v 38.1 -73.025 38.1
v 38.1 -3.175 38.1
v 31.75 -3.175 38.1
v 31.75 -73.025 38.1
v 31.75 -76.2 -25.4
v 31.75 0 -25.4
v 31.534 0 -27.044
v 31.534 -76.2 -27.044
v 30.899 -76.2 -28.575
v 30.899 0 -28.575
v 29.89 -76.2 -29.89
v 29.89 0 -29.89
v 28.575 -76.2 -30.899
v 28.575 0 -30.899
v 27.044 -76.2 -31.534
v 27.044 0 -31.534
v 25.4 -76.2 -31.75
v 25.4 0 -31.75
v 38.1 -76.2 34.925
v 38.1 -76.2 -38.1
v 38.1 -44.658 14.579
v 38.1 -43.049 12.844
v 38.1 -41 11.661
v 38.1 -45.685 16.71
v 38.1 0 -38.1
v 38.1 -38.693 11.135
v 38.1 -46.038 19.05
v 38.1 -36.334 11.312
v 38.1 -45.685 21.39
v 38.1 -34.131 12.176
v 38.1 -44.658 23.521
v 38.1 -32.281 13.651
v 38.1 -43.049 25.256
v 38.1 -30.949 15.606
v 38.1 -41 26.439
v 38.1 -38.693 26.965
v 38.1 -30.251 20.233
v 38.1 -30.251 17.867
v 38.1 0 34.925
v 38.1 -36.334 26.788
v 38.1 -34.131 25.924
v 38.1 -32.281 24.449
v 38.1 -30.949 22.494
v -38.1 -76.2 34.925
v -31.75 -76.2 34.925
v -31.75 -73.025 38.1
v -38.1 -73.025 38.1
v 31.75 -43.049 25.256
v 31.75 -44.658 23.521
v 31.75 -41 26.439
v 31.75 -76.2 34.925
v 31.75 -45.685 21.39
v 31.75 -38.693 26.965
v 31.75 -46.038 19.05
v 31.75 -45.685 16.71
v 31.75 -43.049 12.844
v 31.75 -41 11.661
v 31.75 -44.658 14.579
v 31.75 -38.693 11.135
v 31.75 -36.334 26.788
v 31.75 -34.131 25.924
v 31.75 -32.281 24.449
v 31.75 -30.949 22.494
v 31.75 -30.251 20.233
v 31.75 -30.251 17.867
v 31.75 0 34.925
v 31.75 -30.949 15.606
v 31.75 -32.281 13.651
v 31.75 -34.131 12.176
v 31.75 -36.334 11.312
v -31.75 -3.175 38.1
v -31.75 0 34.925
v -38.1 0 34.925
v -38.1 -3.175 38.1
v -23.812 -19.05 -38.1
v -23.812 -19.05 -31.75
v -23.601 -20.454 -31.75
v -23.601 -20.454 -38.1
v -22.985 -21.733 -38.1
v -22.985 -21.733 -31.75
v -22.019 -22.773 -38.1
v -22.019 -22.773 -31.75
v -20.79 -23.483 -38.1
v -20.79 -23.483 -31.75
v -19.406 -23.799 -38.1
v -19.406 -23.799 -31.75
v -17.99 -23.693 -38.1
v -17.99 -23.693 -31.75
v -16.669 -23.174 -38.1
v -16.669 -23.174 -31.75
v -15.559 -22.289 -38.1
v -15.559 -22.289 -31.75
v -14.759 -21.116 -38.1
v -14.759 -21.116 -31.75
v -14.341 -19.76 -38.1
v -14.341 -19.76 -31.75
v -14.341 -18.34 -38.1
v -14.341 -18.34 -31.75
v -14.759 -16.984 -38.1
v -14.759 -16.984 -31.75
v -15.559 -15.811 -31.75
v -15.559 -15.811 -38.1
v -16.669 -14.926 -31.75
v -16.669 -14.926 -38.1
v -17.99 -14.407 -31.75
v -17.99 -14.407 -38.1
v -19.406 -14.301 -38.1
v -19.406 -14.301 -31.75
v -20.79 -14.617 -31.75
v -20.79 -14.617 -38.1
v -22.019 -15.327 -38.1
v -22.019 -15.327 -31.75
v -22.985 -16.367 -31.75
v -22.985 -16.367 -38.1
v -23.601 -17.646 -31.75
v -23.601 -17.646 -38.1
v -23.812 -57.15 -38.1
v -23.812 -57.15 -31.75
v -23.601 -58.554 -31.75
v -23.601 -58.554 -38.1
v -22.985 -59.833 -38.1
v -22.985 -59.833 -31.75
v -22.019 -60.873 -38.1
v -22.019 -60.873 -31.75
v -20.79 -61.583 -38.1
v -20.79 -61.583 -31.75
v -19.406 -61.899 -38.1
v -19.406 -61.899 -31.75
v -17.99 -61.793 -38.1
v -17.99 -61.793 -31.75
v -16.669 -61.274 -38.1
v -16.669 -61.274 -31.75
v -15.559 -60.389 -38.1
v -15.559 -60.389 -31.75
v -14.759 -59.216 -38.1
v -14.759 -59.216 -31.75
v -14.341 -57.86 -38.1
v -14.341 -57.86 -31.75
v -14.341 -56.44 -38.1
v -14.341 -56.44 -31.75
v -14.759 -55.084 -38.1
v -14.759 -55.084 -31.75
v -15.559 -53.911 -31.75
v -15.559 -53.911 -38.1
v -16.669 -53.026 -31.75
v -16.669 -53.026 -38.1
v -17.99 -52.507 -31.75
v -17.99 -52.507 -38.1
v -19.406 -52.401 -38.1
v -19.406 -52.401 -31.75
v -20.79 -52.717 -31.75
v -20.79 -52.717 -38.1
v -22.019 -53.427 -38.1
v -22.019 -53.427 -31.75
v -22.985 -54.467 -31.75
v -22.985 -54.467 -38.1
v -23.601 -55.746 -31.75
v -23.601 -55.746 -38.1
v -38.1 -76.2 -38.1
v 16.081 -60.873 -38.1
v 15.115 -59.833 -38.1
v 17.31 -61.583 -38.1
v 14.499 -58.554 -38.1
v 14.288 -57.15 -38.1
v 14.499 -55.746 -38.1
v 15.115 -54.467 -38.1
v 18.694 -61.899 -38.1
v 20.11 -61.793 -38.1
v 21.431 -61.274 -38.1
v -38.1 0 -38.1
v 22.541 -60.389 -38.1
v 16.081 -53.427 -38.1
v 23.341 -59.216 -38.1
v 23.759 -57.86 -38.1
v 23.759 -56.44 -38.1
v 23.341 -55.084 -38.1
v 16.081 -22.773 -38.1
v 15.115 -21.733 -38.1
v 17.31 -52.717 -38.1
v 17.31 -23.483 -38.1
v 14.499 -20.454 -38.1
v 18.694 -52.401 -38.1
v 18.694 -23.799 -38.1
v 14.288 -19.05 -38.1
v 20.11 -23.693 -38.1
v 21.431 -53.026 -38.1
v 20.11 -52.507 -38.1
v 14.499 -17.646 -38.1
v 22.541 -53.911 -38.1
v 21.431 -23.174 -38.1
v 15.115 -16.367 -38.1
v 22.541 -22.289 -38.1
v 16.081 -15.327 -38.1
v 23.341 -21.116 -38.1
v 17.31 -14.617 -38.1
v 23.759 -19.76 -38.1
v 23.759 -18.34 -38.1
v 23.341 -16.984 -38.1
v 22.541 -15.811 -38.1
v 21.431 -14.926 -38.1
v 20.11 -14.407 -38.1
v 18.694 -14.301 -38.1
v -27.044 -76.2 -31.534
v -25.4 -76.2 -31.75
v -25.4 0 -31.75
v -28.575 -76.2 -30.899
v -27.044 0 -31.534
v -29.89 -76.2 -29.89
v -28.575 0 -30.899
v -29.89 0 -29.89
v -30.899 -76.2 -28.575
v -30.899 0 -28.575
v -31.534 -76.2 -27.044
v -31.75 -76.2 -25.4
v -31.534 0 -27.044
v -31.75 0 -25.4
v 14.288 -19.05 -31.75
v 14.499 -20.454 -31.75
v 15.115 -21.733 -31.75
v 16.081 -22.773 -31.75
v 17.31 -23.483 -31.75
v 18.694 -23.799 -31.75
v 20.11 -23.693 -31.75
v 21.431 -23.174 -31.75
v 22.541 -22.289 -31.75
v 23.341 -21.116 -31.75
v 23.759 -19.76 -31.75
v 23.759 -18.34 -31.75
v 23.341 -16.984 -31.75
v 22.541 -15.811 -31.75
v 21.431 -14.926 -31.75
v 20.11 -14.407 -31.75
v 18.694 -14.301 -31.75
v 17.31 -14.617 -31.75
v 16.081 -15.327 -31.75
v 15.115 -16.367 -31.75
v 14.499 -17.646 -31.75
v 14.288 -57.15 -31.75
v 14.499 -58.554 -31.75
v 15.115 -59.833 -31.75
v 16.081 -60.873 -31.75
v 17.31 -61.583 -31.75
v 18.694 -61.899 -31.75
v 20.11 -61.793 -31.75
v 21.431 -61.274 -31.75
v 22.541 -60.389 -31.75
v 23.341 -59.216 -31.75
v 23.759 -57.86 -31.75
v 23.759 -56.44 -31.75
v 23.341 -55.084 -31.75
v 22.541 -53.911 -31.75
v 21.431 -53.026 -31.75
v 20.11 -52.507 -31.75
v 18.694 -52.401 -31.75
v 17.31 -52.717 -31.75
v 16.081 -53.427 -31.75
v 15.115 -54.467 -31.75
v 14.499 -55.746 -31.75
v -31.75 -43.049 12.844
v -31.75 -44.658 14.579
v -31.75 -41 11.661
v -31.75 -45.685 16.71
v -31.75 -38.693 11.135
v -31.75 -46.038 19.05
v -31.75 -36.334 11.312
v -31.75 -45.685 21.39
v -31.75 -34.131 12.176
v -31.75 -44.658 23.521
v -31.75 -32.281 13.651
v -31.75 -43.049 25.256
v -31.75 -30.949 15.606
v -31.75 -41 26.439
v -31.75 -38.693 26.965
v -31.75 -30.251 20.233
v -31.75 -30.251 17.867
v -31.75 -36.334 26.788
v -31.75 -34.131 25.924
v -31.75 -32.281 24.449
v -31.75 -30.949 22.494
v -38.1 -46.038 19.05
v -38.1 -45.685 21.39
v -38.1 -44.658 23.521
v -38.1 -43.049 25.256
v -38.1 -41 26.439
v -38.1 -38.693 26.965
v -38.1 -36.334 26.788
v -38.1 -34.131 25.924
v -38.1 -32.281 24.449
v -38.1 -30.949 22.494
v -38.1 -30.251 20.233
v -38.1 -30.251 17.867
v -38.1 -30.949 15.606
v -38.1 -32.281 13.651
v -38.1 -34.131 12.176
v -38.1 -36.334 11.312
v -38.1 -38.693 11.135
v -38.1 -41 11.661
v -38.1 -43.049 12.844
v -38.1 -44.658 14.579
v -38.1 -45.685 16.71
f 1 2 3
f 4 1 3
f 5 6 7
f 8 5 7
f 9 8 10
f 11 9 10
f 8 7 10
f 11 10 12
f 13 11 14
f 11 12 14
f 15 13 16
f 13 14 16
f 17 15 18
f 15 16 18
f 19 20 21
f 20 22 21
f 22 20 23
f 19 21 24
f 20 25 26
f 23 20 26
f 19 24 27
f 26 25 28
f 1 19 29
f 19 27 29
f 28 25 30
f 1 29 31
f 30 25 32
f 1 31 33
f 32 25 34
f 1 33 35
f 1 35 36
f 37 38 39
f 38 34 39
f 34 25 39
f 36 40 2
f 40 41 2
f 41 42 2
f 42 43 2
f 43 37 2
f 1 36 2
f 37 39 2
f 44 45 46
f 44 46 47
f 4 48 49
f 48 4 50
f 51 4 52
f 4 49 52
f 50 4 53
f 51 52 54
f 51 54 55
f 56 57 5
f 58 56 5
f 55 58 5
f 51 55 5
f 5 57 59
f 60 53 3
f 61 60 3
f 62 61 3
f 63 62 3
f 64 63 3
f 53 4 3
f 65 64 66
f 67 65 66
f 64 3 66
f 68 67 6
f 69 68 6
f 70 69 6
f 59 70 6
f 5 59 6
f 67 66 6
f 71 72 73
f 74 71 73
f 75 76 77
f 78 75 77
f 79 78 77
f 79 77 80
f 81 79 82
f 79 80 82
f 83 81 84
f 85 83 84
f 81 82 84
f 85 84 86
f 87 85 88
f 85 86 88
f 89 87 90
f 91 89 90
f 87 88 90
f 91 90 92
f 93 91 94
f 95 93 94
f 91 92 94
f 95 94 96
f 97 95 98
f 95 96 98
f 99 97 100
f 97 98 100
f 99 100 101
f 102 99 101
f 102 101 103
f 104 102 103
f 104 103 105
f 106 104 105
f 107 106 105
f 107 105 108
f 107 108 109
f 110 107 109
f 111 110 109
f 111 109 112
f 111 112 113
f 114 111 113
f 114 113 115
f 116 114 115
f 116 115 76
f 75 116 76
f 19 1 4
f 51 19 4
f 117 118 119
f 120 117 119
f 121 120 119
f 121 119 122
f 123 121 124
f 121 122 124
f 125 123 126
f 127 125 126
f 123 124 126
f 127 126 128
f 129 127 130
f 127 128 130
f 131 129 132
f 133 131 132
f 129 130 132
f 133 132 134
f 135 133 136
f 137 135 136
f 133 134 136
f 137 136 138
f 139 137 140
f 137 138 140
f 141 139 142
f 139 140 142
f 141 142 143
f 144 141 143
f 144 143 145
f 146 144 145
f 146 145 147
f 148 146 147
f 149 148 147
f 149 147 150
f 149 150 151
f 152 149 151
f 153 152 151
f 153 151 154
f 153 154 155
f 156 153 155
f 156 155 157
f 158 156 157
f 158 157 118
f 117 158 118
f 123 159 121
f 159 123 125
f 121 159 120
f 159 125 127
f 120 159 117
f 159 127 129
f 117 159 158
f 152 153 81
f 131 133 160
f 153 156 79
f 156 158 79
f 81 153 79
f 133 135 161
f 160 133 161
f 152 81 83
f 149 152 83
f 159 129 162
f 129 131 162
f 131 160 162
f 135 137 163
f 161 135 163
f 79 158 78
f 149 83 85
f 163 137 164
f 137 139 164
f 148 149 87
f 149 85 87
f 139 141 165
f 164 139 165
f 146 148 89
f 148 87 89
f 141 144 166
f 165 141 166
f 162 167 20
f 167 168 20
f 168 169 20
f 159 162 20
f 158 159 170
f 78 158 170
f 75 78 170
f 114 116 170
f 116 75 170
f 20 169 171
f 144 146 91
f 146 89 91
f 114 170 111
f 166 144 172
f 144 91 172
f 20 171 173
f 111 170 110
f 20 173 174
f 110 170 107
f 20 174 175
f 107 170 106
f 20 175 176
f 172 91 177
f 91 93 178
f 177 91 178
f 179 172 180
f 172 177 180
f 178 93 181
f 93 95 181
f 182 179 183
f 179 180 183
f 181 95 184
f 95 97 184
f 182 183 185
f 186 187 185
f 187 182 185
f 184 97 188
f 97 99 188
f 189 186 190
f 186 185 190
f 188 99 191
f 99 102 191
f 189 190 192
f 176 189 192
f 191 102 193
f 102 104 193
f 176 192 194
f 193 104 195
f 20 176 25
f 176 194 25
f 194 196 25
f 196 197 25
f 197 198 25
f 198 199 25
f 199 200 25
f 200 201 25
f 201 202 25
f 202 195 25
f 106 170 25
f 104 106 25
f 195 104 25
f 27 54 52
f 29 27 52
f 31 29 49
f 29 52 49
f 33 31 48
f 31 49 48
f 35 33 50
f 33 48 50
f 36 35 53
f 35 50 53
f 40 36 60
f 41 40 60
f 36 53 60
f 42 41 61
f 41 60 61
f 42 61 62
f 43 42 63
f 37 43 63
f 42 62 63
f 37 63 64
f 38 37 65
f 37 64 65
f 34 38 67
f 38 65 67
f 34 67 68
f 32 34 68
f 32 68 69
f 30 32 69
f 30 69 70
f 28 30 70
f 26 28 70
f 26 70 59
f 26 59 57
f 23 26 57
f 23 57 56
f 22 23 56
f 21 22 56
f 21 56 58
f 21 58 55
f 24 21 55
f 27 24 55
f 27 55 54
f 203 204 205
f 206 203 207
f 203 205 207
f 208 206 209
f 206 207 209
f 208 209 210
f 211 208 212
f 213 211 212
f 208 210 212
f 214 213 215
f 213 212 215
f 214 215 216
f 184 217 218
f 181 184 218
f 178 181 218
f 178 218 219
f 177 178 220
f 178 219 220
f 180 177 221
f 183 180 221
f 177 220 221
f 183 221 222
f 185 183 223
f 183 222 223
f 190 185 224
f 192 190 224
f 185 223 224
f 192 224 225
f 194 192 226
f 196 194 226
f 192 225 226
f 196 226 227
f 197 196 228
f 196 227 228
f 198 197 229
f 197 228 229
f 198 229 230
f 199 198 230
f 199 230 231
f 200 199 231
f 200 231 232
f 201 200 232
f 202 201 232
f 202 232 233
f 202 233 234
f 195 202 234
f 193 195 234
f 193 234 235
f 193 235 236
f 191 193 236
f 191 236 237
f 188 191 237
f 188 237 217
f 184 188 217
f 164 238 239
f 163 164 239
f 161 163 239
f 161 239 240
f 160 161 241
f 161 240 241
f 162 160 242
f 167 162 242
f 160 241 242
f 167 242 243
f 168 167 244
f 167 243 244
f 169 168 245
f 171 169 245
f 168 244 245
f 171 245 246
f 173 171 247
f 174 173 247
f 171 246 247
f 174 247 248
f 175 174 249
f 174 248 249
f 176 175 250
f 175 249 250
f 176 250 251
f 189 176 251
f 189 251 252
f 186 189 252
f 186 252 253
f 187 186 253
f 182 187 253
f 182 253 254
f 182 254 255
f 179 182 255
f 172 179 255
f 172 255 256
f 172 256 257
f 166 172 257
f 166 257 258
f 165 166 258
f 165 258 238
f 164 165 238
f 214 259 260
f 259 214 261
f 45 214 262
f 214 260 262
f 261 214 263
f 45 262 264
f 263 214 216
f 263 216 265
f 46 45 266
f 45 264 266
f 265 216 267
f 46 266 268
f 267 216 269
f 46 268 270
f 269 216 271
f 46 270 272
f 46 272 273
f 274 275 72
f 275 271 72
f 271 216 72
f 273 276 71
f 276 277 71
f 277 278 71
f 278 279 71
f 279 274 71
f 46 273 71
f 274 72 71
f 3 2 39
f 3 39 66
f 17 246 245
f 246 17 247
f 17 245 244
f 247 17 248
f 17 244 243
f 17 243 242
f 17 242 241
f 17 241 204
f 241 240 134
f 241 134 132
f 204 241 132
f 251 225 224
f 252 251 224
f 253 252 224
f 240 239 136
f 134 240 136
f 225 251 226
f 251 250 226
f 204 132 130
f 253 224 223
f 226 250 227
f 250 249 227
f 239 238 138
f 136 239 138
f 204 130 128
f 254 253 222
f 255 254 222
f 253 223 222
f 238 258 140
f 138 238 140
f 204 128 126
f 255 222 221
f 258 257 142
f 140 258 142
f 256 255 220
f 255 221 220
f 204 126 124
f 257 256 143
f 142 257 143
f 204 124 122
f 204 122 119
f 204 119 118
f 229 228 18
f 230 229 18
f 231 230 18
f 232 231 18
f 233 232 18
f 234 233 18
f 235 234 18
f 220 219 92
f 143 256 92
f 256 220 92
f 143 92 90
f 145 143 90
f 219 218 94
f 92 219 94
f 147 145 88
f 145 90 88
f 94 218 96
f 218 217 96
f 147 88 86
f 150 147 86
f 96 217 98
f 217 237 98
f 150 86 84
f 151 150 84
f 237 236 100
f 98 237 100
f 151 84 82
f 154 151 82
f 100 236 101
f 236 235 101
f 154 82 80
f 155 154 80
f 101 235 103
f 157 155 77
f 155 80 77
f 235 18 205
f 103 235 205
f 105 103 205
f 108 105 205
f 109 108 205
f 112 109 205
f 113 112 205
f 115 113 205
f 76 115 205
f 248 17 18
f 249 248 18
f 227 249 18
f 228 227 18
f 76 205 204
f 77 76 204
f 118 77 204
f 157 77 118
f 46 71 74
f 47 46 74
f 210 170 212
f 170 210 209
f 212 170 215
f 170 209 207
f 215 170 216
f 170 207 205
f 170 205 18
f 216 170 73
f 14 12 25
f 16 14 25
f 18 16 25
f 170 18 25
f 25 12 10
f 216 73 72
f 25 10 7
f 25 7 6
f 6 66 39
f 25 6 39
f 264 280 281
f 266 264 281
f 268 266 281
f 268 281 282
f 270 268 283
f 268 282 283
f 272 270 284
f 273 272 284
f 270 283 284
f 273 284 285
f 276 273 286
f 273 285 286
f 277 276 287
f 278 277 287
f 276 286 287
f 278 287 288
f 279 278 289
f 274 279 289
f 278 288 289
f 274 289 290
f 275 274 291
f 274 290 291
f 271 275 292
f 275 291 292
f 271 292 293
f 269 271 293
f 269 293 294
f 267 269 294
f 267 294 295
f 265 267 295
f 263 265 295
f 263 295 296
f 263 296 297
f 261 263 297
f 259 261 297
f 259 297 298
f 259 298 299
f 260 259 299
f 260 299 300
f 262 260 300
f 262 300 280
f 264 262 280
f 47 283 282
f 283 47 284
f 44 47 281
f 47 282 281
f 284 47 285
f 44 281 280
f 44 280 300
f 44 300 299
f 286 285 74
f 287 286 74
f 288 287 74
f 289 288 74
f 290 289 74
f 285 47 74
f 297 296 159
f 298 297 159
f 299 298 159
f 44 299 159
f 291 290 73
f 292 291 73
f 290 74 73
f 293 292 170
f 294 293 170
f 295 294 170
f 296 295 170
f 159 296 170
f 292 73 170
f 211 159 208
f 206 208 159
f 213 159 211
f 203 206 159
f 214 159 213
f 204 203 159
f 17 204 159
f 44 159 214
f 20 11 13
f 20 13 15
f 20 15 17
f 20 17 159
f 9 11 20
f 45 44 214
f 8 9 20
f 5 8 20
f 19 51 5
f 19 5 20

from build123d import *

# Parameters (mm, degrees)
F1_DEPTH = 76.2
F3_D     = 15.875
F4_SIZE  = 3.175
F6_D     = 9.525


with BuildPart() as f1:
    # F0 (on Front) → F1 (new body)
    with BuildSketch(Plane.XZ):
        with BuildLine():
            Line((-31.750001, 38.1), (-38.1, 38.1))
            Line((-38.1, 38.1), (-38.1, -38.1))
            Line((-38.1, -38.1), (38.1, -38.1))
            Line((38.1, -38.1), (38.1, 38.1))
            Line((38.1, 38.1), (31.75, 38.1))
            Line((31.75, 38.1), (31.75, -25.400001))
            ThreePointArc((31.75, -25.400001), (29.890128, -29.890129), (25.4, -31.750001))
            Line((25.4, -31.750001), (-25.400001, -31.750001))
            ThreePointArc((-25.400001, -31.750001), (-29.890129, -29.890129), (-31.750001, -25.400001))
            Line((-31.750001, -25.400001), (-31.750001, 38.1))
        make_face()
    extrude(amount=F1_DEPTH)

    # F3 (through all)
    with Locations(Plane.YZ.offset(38.1)):
        with Locations((-38.1, 19.05)):
            Hole(F3_D / 2)

    # F4
    f4_edges = [f1.edges().sort_by_distance(p)[0] for p in [
        (-34.925001, 0, 38.1),
        (34.925, 0, 38.1),
        (34.925, -76.2, 38.1),
        (-34.925001, -76.2, 38.1),
    ]]
    chamfer(f4_edges, length=F4_SIZE)

    # F6 (through all)
    with Locations(Plane(origin=(0, 0, -38.1), x_dir=(1, 0, 0), z_dir=(0, 0, -1))):
        with Locations((-19.05, 57.15), (19.05, 57.15), (-19.05, 19.05), (19.05, 19.05)):
            Hole(F6_D / 2)


solid = f1.part
